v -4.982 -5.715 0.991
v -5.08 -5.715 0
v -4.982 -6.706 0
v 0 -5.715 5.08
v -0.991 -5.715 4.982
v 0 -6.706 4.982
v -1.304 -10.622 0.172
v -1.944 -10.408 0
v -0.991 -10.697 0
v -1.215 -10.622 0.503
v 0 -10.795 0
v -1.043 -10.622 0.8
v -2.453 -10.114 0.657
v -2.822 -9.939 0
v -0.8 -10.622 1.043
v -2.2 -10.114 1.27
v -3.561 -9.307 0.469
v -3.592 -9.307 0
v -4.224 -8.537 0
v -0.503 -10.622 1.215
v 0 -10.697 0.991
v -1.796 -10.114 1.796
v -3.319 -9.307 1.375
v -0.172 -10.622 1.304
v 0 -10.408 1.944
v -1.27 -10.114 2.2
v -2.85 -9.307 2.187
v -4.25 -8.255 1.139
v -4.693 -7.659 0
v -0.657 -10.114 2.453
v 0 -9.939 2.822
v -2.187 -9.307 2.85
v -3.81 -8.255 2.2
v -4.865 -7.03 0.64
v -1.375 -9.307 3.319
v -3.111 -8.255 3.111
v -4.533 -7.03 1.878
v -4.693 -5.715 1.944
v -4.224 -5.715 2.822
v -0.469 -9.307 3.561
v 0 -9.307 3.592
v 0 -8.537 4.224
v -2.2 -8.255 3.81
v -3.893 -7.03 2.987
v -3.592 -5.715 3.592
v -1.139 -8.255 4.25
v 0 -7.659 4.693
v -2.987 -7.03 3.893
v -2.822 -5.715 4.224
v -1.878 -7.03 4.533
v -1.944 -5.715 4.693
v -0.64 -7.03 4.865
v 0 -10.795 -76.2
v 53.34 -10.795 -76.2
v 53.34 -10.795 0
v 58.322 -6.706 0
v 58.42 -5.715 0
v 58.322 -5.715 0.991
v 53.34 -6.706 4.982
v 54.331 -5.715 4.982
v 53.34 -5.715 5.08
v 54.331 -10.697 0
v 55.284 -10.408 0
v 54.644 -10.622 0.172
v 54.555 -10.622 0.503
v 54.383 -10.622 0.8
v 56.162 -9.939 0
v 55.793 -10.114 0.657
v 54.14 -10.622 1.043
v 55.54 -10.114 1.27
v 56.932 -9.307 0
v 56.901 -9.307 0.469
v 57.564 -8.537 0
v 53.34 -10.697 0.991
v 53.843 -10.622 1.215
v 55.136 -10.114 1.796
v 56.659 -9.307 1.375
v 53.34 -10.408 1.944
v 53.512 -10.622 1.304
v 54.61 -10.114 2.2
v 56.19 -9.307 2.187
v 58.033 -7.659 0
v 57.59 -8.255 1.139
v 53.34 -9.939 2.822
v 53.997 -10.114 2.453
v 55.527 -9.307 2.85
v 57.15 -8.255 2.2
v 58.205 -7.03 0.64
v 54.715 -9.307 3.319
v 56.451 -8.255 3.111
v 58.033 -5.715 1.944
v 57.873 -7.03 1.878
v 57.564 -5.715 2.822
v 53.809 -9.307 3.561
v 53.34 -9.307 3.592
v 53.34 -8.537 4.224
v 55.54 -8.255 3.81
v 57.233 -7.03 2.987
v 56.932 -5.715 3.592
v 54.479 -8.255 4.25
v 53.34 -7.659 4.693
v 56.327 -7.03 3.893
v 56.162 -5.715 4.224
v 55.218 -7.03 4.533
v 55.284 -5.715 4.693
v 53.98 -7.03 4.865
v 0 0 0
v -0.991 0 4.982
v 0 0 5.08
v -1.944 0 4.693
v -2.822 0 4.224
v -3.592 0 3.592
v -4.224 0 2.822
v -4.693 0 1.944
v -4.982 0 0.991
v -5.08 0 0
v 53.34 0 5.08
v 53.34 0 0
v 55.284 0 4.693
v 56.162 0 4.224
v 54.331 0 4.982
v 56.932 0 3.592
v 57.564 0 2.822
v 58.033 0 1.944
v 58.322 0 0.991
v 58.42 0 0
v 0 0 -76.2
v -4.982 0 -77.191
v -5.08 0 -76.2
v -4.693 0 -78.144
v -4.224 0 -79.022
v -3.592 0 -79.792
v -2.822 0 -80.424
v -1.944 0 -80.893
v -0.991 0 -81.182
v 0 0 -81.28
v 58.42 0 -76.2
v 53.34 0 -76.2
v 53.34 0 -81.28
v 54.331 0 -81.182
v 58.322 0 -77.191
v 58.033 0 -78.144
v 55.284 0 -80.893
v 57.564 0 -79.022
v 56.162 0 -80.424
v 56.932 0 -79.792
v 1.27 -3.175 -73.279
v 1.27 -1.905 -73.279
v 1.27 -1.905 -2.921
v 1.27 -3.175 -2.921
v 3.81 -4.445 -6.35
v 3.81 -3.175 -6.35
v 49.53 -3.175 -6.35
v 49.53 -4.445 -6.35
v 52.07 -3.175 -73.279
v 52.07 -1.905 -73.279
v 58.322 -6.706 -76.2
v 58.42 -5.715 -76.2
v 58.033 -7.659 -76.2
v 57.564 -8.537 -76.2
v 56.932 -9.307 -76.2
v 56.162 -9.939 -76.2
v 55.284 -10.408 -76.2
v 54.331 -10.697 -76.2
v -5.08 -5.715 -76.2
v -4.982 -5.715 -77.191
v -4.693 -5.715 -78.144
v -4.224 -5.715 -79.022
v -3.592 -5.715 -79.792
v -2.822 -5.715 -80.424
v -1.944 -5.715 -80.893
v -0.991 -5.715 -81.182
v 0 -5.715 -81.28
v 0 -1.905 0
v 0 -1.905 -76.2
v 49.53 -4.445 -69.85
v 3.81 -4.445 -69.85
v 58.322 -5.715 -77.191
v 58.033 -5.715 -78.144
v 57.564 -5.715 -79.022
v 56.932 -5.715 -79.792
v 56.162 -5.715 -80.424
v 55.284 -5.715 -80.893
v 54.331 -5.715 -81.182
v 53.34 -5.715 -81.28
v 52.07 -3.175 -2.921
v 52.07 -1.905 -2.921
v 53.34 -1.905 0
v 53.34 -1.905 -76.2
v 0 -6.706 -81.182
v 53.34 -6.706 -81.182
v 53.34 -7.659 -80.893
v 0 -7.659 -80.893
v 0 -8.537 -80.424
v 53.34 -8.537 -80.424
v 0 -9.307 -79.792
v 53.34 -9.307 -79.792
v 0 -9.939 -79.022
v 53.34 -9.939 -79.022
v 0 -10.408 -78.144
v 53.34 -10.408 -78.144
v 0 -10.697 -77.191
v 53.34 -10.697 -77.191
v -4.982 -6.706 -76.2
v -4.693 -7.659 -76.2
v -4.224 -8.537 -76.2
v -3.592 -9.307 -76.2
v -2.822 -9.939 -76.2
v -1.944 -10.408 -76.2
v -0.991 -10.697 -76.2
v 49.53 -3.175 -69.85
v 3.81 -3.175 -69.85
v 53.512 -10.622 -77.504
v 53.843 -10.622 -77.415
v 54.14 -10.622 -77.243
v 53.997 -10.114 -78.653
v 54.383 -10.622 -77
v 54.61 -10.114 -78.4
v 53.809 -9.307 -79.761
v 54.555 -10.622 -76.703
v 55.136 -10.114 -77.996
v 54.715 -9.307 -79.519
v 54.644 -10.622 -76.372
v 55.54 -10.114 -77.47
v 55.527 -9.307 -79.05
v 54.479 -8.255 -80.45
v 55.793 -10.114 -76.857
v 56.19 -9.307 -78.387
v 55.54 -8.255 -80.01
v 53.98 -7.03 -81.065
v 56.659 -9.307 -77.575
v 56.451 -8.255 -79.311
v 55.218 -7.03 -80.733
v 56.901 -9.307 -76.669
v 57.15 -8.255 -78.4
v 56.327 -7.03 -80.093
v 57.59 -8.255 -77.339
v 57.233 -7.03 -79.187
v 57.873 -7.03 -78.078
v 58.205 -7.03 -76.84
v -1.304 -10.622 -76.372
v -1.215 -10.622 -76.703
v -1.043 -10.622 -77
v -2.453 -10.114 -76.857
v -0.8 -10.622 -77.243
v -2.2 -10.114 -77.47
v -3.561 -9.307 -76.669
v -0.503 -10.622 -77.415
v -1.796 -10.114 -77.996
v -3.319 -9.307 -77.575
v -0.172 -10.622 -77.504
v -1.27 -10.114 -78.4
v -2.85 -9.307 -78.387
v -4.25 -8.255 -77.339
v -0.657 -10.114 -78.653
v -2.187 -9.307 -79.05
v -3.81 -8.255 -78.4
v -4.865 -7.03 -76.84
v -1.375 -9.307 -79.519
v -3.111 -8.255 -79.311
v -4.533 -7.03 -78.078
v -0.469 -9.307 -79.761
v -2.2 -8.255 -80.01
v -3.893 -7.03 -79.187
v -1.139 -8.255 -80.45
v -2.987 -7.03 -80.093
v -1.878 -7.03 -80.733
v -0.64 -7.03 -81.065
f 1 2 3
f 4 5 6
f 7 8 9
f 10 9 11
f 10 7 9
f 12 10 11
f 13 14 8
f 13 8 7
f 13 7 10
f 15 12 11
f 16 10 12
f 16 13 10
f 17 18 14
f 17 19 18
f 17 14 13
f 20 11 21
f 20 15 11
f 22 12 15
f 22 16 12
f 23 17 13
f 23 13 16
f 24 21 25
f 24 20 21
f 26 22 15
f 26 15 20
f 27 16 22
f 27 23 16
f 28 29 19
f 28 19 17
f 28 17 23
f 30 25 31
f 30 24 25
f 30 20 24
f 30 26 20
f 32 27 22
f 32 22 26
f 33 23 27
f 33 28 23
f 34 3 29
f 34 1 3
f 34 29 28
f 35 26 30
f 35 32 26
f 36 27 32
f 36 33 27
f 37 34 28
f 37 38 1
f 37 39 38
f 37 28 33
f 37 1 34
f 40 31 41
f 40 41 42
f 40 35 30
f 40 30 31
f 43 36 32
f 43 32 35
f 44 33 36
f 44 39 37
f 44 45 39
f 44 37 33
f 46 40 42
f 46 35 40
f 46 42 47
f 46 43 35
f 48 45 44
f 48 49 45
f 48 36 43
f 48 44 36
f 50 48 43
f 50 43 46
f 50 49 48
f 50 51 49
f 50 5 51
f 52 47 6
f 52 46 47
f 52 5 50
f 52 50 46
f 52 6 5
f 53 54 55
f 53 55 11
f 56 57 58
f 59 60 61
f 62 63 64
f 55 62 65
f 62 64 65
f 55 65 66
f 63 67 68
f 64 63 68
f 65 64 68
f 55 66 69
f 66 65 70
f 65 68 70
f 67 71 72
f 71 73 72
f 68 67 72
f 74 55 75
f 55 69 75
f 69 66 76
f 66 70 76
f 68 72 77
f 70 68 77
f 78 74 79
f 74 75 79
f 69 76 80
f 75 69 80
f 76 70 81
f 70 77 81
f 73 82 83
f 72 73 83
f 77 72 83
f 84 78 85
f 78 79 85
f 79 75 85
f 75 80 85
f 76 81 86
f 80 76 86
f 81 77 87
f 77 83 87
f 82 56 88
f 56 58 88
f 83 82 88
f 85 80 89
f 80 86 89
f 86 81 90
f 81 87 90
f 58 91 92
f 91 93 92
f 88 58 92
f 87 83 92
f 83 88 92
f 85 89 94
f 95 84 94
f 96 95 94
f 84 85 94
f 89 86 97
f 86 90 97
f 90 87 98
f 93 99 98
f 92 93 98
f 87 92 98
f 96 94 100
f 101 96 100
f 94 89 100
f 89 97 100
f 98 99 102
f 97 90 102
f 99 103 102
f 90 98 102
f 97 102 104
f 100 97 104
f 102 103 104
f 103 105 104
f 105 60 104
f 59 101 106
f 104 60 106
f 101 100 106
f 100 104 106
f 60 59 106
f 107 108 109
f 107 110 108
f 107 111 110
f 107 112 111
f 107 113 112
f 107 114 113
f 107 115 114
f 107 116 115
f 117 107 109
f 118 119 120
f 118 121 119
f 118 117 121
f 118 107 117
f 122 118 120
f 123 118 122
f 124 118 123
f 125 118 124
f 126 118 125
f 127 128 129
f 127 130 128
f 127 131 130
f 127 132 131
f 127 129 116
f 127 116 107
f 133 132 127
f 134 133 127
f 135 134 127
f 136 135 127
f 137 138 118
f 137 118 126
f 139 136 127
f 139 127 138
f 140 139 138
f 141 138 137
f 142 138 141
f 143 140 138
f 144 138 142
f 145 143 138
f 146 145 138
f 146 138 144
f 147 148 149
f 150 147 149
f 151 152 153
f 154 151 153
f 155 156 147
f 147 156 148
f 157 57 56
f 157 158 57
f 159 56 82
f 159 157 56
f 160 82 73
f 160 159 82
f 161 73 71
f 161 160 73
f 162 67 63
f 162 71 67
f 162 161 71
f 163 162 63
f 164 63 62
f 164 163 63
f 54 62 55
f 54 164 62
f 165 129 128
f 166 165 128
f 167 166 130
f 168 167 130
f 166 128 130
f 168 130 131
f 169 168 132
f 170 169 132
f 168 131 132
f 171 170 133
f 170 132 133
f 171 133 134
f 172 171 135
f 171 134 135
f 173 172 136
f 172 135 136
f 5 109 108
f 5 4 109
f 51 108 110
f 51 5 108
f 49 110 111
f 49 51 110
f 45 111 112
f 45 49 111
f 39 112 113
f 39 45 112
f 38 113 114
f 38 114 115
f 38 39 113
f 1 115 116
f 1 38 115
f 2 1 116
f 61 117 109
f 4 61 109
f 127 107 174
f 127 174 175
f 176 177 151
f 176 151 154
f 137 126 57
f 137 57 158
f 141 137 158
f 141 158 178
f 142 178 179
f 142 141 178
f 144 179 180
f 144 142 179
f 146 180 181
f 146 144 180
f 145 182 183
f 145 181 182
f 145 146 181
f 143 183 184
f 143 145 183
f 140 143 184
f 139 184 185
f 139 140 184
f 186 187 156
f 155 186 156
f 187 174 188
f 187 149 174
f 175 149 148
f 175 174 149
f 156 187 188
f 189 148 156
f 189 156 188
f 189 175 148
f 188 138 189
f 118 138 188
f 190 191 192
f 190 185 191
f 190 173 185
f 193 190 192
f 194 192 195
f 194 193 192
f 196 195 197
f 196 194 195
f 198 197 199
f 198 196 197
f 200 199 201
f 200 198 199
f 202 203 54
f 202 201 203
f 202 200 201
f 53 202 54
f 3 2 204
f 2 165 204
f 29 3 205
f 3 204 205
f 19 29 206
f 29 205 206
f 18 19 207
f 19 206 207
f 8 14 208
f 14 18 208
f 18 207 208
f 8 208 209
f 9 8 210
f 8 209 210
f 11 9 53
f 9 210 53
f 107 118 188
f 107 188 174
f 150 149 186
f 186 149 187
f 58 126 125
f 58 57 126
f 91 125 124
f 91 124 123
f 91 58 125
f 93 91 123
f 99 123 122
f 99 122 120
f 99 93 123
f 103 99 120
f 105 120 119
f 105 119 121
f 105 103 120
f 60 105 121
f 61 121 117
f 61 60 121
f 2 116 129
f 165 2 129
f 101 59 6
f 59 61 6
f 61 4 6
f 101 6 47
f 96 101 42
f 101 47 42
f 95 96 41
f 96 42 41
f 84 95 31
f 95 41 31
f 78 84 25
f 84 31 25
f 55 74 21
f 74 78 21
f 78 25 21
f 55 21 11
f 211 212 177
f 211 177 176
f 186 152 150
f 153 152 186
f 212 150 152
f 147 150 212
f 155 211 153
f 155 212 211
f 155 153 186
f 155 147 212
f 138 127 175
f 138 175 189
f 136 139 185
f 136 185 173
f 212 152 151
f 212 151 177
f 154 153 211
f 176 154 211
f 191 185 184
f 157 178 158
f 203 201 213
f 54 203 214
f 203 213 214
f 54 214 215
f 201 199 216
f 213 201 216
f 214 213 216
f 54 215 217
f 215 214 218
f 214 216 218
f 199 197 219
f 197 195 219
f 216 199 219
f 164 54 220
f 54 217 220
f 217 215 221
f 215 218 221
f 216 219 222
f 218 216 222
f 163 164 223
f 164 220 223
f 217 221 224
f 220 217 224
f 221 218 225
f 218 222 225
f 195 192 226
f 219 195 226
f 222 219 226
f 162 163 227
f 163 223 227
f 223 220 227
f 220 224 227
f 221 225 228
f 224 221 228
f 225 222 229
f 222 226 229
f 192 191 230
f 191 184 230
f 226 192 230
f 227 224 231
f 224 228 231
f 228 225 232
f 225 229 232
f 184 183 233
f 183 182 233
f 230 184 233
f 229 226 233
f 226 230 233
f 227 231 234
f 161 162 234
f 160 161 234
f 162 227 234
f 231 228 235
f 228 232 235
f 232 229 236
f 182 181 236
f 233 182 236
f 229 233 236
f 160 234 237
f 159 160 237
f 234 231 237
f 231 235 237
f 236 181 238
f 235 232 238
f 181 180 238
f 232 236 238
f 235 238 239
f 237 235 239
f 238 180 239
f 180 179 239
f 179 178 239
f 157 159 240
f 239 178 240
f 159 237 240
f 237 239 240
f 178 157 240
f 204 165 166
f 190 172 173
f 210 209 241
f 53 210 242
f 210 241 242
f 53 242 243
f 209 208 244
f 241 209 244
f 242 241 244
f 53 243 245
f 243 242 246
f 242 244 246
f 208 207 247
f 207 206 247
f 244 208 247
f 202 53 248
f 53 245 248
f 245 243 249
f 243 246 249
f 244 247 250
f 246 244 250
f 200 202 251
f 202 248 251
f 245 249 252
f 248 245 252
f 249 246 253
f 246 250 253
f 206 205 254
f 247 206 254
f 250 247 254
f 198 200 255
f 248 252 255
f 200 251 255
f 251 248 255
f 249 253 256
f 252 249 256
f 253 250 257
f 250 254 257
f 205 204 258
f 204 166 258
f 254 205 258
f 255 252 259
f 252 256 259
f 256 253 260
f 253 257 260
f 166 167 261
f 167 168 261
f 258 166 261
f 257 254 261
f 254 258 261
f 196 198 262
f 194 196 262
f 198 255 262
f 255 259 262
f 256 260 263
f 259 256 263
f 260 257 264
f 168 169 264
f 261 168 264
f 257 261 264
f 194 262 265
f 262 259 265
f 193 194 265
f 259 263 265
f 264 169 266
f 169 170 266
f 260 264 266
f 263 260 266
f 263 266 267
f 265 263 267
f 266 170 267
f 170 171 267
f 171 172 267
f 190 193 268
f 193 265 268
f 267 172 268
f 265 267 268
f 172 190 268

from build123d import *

# Parameters (mm, degrees)
SKETCH1_W           = 5.08
SKETCH1_H           = 5.08
BOSS_EXTRUDE1_DEPTH = 5.715
SKETCH2_W           = 63.5
SKETCH2_H           = 86.36
BOSS_EXTRUDE2_DEPTH = 5.08
FILLET1_R           = 5.08
SKETCH3_W           = 53.34
SKETCH3_H           = 76.2
BOSS_EXTRUDE3_DEPTH = 3.81
CUT_EXTRUDE1_DEPTH  = 1.27
SKETCH6_W           = 45.72
SKETCH6_H           = 63.5
CUT_EXTRUDE2_DEPTH  = 2.54


with BuildPart() as part:
    # Sketch1 → Boss-Extrude1 (new body)
    with BuildSketch(Plane(origin=(0, 0, 0), x_dir=(1, 0, 0), z_dir=(0, 1, 0))):
        Polygon((-5.08, 0), (0, 0), (0, 76.2), (53.34, 76.2), (53.34, 81.28), (-5.08, 81.28), align=None)
        Polygon((53.34, 0), (0, 0), (0, -5.08), (58.42, -5.08), (58.42, 76.2), (53.34, 76.2), align=None)
        with Locations((-2.54, -2.54)):
            Rectangle(SKETCH1_W, SKETCH1_H)
        with Locations((55.88, 78.74)):
            Rectangle(SKETCH1_W, SKETCH1_H)
    extrude(amount=-BOSS_EXTRUDE1_DEPTH)

    # Sketch2 → Boss-Extrude2 (add)
    with BuildSketch(Plane(origin=(0, -5.715, 0), x_dir=(-1, 0, 0), z_dir=(0, -1, 0))):
        with Locations((-26.67, 38.1)):
            Rectangle(SKETCH2_W, SKETCH2_H)
    extrude(amount=BOSS_EXTRUDE2_DEPTH)

    # Fillet1
    fillet1_edges = [part.edges().sort_by_distance(p)[0] for p in [
        (-5.08, -5.3975, 5.08),
        (-5.08, -5.3975, -81.28),
        (58.42, -5.3975, -81.28),
        (58.42, -5.3975, 5.08),
        (-5.08, -10.795, -38.1),
        (26.67, -10.795, -81.28),
        (58.42, -10.795, -38.1),
        (26.67, -10.795, 5.08),
    ]]
    fillet(fillet1_edges, radius=FILLET1_R)

    # Sketch3 → Boss-Extrude3 (add)
    with BuildSketch(Plane(origin=(0, -5.715, 0), x_dir=(1, 0, 0), z_dir=(0, 1, 0))):
        with Locations((26.67, 38.1)):
            Rectangle(SKETCH3_W, SKETCH3_H)
    extrude(amount=BOSS_EXTRUDE3_DEPTH)

    # Sketch4 → Cut-Extrude1 (cut)
    with BuildSketch(Plane(origin=(0, -1.905, 0), x_dir=(1, 0, 0), z_dir=(0, 1, 0))):
        Polygon((48.895, 69.85), (51.2953, 73.279), (2.0447, 73.279), (4.445, 69.85), align=None)
        Polygon((52.07, 73.279), (51.2953, 73.279), (48.895, 69.85), (49.53, 69.85), (49.53, 6.35), (48.895, 6.35), (51.2953, 2.921), (52.07, 2.921), align=None)
        Polygon((48.895, 6.35), (4.445, 6.35), (2.0447, 2.921), (51.2953, 2.921), align=None)
        Polygon((4.445, 69.85), (2.0447, 73.279), (1.27, 73.279), (1.27, 2.921), (2.0447, 2.921), (4.445, 6.35), (3.81, 6.35), (3.81, 69.85), align=None)
    extrude(amount=-CUT_EXTRUDE1_DEPTH, mode=Mode.SUBTRACT)

    # Sketch6 → Cut-Extrude2 (cut)
    with BuildSketch(Plane(origin=(0, -1.905, 0), x_dir=(1, 0, 0), z_dir=(0, 1, 0))):
        with Locations((26.67, 38.1)):
            Rectangle(SKETCH6_W, SKETCH6_H)
    extrude(amount=-CUT_EXTRUDE2_DEPTH, mode=Mode.SUBTRACT)


solid = part.part
